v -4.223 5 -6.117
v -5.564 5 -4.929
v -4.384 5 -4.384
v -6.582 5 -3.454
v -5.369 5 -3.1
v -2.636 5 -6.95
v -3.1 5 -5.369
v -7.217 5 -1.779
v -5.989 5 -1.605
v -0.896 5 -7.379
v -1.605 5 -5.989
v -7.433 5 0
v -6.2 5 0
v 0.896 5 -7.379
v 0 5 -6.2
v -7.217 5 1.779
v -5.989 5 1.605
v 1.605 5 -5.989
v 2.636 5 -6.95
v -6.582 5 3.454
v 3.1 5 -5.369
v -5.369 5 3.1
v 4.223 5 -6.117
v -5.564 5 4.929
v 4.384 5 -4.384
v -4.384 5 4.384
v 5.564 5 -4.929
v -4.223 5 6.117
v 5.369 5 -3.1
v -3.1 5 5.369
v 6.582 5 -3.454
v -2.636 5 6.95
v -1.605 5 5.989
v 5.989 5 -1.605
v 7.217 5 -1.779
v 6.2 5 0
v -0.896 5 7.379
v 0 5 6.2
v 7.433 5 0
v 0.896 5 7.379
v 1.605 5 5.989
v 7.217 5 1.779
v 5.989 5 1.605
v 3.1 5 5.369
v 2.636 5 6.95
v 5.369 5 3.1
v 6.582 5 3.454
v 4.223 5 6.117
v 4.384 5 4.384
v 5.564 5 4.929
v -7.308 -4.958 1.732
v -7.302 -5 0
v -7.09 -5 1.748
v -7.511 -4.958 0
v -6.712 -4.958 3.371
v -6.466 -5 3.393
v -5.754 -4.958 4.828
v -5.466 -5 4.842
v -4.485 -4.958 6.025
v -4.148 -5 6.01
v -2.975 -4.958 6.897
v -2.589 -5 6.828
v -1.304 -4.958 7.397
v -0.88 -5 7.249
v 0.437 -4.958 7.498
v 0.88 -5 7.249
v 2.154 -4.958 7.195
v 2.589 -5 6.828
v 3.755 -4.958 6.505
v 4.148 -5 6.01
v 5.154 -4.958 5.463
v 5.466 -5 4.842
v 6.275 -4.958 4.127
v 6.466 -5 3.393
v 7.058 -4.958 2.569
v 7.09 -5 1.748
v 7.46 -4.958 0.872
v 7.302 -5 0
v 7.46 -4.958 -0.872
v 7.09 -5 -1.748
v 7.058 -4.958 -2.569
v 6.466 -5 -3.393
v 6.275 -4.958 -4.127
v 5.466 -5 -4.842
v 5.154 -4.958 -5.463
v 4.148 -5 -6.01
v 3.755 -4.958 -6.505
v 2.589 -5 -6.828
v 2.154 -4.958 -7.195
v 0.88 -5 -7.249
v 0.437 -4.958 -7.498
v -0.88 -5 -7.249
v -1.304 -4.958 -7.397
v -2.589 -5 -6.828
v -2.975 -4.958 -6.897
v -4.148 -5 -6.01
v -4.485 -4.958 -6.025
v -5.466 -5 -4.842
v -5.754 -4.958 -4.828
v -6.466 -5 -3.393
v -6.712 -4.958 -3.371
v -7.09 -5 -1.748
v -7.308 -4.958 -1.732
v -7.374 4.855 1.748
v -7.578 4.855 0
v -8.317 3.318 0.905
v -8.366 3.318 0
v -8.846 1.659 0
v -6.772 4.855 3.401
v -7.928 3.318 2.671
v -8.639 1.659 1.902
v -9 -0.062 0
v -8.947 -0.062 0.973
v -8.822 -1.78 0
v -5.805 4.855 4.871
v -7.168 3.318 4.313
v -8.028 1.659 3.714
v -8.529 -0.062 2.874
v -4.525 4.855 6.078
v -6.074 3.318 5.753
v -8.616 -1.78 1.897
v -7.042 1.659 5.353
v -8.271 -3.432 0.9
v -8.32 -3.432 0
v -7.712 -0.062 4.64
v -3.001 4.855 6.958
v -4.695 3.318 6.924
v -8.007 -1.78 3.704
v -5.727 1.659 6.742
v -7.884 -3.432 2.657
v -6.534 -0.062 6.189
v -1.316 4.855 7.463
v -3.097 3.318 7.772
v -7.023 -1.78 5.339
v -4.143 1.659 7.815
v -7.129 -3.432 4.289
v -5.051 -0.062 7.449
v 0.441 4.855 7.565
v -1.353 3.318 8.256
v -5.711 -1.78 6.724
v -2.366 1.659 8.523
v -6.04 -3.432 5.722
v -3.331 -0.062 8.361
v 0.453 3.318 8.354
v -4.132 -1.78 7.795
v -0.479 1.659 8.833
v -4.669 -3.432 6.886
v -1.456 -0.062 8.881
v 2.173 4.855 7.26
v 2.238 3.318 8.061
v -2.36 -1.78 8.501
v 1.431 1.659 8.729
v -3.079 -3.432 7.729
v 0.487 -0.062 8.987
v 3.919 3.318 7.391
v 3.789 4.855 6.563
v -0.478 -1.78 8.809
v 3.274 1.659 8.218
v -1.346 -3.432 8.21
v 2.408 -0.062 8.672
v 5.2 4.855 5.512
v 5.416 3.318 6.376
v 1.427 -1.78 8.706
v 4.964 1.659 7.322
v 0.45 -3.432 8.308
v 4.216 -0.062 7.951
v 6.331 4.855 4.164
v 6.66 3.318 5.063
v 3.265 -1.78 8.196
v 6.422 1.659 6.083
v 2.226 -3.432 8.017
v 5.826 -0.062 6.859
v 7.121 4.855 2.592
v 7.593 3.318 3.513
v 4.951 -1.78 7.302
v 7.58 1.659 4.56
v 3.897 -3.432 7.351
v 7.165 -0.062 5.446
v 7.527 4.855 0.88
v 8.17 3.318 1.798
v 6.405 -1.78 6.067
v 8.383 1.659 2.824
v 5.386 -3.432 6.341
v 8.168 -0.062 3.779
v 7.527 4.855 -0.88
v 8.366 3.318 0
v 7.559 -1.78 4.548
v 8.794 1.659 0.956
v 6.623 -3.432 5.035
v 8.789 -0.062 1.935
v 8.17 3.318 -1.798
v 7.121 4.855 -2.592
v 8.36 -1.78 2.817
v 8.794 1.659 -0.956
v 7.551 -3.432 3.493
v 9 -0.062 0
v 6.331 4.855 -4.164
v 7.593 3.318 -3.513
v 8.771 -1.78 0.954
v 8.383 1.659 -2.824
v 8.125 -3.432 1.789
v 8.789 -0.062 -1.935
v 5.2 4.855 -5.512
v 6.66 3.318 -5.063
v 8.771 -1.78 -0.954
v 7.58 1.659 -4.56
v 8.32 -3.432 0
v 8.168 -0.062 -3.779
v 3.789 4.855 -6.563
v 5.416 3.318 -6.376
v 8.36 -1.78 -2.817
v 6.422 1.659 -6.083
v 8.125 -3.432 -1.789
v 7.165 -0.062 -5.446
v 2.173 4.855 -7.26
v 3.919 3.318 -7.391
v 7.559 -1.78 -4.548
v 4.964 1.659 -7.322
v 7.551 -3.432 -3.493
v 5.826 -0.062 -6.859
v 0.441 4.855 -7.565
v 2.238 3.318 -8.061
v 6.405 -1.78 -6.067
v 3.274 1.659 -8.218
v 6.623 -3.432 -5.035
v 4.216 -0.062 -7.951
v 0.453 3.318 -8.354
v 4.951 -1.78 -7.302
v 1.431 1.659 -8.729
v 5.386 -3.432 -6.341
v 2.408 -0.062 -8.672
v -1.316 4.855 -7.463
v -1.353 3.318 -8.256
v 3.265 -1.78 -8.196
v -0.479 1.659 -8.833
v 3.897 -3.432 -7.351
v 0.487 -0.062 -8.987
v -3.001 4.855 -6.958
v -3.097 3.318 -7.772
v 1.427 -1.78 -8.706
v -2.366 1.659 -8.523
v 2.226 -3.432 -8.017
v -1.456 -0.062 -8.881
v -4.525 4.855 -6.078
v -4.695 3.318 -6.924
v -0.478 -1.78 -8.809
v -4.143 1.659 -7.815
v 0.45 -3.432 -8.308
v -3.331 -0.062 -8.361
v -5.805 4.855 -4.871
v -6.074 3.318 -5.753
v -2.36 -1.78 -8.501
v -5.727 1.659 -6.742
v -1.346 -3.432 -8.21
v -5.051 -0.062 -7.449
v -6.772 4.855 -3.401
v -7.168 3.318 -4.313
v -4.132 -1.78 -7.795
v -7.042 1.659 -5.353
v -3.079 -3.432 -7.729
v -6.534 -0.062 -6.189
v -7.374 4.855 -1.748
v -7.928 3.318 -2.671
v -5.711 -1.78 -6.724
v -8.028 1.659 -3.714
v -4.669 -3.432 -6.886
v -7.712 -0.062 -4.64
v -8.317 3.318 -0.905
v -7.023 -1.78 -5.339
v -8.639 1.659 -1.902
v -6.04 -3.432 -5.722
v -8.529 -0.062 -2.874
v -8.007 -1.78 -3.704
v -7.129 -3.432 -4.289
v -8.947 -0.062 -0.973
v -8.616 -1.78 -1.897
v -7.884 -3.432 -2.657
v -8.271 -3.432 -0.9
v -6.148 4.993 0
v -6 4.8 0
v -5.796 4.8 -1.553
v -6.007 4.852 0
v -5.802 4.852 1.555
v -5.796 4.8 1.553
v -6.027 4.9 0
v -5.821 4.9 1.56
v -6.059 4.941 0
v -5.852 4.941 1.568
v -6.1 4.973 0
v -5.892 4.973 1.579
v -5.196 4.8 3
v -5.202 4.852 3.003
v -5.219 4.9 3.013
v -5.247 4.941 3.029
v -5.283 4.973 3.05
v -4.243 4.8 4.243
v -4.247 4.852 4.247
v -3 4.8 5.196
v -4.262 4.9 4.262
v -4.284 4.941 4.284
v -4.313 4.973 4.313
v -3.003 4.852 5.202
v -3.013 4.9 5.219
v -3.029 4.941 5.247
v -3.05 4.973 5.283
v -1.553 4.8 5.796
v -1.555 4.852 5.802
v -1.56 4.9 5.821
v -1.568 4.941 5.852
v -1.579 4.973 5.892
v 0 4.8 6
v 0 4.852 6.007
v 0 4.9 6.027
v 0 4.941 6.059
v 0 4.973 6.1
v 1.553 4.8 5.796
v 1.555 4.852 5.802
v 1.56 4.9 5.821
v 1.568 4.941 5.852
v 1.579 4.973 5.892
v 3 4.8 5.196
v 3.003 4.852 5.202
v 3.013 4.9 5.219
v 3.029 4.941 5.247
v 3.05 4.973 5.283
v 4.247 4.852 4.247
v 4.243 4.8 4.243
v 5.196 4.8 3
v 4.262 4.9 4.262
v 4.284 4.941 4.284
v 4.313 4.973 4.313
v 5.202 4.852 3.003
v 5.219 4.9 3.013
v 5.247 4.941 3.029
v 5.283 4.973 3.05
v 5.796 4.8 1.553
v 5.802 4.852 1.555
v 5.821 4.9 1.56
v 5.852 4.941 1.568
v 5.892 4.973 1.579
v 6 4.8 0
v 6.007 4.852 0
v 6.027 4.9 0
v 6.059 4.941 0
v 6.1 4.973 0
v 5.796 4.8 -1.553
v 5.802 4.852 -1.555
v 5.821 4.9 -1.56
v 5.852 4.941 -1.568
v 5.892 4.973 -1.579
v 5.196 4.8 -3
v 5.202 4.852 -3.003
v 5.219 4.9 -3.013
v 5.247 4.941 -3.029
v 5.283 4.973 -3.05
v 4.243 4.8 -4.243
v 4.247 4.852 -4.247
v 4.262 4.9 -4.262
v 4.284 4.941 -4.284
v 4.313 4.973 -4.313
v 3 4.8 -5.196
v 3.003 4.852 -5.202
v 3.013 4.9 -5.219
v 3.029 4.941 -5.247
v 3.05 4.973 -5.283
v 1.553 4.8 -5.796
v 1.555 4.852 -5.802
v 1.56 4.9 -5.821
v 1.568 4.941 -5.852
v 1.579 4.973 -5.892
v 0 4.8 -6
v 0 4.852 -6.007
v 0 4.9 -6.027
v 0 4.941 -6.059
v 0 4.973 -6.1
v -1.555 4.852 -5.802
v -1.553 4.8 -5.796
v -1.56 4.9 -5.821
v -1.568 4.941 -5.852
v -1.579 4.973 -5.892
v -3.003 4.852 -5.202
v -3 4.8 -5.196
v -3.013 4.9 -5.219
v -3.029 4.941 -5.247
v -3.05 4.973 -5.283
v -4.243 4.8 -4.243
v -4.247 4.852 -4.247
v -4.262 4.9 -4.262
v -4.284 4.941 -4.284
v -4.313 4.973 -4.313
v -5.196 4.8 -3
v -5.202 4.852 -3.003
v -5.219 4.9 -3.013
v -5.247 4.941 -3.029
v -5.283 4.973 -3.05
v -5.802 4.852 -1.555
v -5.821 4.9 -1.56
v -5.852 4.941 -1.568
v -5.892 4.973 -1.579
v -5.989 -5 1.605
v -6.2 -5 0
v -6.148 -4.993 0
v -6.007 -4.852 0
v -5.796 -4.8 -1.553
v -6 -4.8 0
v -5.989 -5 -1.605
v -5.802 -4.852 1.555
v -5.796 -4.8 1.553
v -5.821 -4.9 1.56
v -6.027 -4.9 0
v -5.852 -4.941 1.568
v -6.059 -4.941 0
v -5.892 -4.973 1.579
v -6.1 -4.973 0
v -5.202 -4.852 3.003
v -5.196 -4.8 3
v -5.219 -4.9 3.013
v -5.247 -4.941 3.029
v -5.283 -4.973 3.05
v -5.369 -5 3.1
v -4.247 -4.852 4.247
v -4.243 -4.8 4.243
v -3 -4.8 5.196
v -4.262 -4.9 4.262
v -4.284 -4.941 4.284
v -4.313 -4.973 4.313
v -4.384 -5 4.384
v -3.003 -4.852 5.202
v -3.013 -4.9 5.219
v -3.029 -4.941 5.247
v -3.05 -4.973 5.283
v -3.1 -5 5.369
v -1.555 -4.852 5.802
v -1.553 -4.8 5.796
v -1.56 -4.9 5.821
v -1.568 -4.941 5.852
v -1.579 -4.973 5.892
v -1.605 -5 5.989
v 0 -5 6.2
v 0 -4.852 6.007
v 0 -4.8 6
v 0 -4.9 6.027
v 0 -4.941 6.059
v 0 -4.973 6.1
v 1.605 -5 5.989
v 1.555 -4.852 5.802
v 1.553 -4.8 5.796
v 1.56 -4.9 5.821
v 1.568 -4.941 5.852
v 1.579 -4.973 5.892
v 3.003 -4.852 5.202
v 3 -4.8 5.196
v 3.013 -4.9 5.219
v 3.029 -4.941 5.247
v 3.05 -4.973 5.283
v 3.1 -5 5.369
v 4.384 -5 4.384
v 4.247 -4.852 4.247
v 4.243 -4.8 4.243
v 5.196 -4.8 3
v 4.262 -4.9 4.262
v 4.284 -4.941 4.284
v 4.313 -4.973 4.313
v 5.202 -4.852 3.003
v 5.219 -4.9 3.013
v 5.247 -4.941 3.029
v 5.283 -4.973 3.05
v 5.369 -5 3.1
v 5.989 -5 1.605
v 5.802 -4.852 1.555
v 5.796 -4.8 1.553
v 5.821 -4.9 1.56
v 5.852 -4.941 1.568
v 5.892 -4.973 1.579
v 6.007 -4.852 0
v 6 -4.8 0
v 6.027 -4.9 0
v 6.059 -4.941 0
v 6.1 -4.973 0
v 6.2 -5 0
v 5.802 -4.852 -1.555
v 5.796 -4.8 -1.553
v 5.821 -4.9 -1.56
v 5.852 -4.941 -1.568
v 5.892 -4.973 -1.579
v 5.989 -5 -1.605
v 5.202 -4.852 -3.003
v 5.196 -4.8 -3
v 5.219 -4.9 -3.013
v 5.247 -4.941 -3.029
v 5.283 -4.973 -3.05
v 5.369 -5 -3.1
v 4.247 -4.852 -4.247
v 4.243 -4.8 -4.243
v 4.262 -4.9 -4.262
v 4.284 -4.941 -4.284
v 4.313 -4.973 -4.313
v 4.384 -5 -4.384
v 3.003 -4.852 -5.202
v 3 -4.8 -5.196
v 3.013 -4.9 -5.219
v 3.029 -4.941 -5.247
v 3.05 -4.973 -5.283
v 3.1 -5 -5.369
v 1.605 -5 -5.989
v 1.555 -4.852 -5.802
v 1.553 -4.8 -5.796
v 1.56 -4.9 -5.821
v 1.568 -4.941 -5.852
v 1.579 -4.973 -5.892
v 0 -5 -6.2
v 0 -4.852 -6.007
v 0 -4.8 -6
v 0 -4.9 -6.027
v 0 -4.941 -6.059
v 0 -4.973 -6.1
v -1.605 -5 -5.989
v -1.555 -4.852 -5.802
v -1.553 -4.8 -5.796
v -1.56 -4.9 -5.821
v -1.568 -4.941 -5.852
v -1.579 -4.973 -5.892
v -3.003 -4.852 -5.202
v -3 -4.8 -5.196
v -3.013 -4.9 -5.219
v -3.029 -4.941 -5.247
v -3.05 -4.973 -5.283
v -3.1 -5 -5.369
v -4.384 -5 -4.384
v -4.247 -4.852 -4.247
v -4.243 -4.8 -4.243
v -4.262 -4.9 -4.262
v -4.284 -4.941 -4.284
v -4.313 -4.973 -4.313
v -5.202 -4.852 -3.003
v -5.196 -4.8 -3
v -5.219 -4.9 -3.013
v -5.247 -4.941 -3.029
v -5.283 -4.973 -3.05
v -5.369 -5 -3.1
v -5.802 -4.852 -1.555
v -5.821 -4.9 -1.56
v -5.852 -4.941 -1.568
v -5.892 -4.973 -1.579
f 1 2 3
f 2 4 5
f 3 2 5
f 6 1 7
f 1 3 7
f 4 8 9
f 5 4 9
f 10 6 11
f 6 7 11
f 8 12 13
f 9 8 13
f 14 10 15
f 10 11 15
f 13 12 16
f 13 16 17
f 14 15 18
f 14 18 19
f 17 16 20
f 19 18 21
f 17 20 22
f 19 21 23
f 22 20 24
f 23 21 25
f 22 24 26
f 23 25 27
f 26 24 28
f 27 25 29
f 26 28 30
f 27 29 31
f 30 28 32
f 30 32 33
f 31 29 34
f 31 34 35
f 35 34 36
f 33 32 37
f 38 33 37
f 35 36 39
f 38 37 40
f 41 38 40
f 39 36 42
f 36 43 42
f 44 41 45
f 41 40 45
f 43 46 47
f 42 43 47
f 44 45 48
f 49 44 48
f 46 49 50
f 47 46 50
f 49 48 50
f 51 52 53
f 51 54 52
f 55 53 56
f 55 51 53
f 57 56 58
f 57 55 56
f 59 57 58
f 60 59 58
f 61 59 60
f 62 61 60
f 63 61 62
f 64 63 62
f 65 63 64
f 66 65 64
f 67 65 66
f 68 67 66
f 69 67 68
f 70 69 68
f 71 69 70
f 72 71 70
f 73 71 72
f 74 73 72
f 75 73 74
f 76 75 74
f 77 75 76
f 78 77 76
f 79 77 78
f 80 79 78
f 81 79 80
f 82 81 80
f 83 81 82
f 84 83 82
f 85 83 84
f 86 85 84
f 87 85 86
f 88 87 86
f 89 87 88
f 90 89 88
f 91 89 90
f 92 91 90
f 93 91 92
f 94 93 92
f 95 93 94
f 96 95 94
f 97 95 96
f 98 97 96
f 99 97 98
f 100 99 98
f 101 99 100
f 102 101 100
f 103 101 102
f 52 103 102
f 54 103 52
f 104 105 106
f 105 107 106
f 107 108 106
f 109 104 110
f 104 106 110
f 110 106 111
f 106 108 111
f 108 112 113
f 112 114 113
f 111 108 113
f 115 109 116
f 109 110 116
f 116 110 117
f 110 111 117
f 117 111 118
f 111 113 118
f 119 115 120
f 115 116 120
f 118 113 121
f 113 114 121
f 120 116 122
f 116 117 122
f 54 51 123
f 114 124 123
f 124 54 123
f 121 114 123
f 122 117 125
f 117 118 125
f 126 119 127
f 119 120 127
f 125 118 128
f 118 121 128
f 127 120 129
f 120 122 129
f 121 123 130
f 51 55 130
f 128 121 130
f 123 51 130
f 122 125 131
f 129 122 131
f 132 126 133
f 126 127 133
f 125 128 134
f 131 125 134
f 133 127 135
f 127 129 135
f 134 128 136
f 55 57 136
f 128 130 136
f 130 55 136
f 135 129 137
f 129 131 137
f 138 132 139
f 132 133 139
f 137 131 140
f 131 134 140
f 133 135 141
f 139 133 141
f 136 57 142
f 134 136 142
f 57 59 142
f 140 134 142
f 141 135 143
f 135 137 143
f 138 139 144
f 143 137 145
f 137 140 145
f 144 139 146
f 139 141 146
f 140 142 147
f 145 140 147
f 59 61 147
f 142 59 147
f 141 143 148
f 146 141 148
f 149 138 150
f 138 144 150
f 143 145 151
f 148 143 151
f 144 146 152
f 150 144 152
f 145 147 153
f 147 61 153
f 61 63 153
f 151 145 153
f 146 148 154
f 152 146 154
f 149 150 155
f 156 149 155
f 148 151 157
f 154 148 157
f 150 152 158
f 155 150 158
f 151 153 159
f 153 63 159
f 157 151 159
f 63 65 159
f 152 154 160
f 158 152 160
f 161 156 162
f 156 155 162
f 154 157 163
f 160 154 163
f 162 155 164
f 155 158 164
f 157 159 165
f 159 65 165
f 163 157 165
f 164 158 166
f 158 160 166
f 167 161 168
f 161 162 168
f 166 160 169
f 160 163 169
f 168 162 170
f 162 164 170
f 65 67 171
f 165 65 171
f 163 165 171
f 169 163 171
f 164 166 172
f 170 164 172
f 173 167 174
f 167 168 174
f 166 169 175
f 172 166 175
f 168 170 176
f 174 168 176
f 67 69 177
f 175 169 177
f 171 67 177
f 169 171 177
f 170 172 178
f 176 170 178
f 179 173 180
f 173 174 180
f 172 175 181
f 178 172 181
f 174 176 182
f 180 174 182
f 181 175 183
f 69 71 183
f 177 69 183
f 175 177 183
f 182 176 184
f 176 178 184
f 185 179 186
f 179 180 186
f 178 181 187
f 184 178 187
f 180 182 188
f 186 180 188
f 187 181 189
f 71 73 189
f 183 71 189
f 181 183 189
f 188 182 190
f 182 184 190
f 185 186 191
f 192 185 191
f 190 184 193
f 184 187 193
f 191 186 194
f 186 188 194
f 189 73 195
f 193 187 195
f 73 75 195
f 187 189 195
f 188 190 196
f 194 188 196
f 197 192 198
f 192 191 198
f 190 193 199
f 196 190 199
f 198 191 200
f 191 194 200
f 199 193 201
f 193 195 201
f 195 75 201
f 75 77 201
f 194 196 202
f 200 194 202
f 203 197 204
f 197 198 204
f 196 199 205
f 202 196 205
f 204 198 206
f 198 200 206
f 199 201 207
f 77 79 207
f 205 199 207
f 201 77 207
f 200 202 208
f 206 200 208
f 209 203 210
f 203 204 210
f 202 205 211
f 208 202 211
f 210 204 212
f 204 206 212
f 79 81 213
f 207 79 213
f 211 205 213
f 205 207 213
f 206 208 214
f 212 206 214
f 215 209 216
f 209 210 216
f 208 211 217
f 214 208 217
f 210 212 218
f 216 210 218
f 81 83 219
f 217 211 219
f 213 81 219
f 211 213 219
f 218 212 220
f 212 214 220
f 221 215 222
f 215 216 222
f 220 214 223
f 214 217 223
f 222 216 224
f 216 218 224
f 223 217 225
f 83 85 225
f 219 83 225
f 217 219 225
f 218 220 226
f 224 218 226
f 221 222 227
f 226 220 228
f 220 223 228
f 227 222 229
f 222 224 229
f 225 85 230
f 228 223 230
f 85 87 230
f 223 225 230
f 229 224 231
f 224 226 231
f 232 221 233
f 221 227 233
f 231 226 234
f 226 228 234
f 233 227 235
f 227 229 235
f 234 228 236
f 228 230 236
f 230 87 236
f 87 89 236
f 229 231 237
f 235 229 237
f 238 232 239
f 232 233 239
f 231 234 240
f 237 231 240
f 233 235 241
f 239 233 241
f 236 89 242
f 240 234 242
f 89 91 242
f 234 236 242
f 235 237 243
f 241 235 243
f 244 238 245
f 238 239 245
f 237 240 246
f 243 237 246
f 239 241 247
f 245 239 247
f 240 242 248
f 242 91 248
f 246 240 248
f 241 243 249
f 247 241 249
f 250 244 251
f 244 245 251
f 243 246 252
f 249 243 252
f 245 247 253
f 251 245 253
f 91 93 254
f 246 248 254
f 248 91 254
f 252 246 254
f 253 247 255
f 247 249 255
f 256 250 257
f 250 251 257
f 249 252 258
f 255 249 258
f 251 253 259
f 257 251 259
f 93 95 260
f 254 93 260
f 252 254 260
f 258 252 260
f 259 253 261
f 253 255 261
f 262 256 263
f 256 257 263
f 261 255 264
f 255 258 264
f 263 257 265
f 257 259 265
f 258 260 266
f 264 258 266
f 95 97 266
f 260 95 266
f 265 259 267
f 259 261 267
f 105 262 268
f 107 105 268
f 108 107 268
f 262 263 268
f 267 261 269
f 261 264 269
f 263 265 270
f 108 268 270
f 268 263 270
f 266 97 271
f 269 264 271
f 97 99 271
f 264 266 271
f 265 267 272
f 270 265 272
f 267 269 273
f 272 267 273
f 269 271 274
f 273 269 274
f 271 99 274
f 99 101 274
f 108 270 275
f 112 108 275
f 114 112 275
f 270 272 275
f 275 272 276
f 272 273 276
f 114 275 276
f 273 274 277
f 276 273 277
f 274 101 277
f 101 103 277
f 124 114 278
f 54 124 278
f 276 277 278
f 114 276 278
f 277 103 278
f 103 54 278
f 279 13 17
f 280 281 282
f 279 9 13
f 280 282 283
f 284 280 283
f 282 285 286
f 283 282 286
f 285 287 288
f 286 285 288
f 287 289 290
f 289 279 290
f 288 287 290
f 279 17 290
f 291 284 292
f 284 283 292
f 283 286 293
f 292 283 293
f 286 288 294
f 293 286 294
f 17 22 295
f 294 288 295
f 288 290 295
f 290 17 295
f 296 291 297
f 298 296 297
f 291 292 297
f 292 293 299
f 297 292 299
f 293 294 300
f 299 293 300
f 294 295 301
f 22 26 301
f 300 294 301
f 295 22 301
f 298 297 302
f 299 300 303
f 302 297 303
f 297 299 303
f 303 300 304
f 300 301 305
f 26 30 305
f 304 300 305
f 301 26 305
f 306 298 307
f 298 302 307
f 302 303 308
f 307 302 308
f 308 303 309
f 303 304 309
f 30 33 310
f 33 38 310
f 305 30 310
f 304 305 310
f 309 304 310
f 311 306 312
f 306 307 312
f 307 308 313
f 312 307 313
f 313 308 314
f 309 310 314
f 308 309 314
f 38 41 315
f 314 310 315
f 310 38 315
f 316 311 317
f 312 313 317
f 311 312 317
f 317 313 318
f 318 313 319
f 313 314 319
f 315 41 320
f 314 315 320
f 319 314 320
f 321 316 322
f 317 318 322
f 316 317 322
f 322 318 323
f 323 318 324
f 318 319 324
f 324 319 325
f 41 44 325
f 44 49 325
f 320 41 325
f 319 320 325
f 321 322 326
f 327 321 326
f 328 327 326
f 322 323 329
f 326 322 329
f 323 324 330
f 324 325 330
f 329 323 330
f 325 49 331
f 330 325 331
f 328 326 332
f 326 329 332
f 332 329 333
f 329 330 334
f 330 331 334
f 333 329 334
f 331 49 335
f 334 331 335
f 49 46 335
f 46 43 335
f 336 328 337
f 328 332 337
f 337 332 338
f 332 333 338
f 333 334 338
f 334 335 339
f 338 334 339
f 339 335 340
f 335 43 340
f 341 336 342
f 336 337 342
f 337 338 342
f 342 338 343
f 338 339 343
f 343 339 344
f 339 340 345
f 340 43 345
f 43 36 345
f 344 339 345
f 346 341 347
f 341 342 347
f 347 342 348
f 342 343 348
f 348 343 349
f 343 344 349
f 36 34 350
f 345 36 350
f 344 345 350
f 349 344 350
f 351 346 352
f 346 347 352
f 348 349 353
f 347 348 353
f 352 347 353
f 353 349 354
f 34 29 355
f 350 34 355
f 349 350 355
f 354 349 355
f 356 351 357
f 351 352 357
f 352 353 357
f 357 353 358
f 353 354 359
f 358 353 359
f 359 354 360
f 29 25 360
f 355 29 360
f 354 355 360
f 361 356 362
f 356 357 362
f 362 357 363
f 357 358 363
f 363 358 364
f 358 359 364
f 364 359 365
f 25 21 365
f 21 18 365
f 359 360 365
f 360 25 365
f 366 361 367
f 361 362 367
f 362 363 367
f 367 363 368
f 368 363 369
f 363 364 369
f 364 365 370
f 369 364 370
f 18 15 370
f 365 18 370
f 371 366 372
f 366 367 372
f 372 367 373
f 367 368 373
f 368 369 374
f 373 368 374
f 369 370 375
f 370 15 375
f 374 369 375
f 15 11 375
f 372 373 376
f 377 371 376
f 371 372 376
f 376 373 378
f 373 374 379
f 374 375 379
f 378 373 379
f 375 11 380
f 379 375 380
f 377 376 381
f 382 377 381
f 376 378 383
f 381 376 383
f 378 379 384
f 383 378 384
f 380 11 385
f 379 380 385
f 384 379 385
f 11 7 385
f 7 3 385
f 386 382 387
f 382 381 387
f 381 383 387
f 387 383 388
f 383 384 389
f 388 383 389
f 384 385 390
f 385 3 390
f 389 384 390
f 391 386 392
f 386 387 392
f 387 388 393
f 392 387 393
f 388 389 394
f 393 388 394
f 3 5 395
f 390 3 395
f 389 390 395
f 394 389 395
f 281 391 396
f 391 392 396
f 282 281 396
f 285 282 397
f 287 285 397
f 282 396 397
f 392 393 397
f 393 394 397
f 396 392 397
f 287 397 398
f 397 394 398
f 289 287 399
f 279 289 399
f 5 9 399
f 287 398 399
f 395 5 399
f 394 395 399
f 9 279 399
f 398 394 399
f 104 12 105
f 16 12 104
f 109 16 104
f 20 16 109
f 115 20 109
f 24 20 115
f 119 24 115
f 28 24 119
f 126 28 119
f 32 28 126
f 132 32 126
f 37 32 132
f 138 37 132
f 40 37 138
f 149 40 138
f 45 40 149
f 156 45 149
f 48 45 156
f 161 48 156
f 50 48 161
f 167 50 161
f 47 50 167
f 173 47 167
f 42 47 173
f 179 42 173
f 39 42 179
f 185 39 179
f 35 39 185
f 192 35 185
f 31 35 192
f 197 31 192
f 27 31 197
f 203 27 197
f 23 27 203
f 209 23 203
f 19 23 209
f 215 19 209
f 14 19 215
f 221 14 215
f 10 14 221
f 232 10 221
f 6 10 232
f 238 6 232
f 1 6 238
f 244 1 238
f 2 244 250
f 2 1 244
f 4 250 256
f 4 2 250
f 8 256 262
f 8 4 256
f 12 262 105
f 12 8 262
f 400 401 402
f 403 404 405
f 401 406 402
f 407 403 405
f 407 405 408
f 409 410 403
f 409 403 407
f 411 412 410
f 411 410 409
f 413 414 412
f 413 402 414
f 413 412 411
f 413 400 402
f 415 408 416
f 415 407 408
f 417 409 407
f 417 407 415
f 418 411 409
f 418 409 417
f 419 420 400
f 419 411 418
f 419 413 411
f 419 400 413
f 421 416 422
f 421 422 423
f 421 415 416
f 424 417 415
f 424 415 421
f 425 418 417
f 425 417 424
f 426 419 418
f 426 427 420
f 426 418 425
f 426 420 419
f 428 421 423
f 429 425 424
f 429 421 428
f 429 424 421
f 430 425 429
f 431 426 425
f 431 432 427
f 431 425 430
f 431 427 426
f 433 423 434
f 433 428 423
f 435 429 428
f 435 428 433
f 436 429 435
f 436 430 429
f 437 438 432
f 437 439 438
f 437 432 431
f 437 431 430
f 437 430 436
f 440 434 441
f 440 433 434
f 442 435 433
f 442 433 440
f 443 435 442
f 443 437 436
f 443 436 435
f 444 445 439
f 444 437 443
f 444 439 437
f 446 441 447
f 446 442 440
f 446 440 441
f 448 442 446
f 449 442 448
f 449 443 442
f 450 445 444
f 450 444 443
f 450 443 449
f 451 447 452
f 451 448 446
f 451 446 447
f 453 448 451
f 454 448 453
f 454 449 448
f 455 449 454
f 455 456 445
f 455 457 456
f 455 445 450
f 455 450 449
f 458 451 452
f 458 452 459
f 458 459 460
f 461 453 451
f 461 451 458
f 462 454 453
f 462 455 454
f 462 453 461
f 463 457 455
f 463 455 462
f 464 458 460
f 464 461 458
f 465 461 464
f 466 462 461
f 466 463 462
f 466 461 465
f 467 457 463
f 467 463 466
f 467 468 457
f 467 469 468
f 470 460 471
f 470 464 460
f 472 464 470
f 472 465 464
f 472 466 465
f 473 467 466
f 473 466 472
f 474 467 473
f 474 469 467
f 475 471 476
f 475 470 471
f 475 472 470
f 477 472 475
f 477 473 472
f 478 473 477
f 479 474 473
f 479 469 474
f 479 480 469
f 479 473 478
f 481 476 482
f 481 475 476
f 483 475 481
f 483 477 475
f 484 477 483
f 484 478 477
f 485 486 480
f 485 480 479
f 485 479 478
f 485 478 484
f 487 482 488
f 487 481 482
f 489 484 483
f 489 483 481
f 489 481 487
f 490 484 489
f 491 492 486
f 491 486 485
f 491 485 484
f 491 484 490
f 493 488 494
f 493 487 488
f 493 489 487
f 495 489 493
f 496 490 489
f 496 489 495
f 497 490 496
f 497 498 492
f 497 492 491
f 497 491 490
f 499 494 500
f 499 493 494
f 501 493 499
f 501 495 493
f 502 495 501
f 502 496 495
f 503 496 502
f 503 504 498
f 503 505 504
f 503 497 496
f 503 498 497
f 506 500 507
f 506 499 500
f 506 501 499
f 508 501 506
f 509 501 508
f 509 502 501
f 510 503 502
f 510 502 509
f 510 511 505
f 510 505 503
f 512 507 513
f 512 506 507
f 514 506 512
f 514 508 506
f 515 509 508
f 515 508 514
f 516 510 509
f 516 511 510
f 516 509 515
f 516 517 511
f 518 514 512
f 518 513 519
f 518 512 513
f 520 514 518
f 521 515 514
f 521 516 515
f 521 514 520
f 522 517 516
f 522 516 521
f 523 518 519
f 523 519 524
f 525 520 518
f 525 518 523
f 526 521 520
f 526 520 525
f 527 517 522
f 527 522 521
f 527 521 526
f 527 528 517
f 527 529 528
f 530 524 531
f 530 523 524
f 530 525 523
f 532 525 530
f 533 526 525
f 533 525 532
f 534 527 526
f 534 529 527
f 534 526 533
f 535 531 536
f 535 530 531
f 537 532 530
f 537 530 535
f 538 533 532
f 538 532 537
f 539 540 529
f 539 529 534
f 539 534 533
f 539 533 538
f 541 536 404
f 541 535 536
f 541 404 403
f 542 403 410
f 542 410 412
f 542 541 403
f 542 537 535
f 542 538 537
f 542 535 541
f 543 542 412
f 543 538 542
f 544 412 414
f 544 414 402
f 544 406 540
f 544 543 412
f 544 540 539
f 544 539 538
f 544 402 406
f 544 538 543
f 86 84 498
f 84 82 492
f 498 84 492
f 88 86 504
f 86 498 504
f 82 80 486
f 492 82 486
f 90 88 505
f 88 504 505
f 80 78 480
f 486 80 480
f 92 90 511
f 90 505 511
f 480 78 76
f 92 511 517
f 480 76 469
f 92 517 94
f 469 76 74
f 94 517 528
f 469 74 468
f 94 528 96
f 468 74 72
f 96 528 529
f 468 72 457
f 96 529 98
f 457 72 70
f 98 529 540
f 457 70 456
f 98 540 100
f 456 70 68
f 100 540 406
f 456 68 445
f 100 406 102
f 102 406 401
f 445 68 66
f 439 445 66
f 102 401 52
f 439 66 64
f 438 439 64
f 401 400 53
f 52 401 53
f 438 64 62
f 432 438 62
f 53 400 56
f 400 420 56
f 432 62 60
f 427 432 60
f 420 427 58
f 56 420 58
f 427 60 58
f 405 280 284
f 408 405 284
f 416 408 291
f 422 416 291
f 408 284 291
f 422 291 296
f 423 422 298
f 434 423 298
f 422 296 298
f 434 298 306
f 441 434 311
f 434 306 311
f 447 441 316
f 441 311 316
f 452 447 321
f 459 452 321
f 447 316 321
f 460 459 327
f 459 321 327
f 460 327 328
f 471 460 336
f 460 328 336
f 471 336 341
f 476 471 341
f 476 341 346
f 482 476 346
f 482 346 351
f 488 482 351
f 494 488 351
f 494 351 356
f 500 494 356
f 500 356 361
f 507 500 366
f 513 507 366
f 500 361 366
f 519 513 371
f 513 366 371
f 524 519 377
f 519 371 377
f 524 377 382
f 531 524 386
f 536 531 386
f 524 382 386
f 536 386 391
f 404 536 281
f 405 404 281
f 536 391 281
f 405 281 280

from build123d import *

# Parameters (mm, degrees)
FILLET1_R       = 0.2
CHAMFER1_SIZE   = 0.181209408
CHAMFER1_SIZE_2 = 0.05


with BuildPart() as part:
    # Sketch1 → Revolve1 (revolve)
    with BuildSketch(Plane.XY):
        with BuildLine():
            Line((-6, -5), (-6, 5))
            Line((-6, 5), (-7.483314774, 5))
            ThreePointArc((-7.483314774, 5), (-9, 0), (-7.483314774, -5))
            Line((-7.483314774, -5), (-6, -5))
        make_face()
    revolve(axis=Axis((0, 0, 0), (0, 1, 0)))

    # Fillet1
    fillet1_edges = [part.edges().sort_by_distance(p)[0] for p in [
        (6, 5, 0),
        (6, -5, 0),
    ]]
    fillet(fillet1_edges, radius=FILLET1_R)

    # Chamfer1
    # the kernel refuses this chamfer: 0.181209408, 0.05 mm, written as the material it takes off along each edge
    with BuildSketch(Plane(origin=(0, -5, 0), x_dir=(-1, 0, 0), z_dir=(0, 0, -1))) as chamfer1_piece_1:
        with BuildLine():
            Line((7.483314774 - CHAMFER1_SIZE, 0), (7.510900969, 0.041535859))
            ThreePointArc((7.510900969, 0.041535859), (7.49854981, 0.022877263), (7.483314774, 0))
            Line((7.483314774, 0), (7.483314774 - CHAMFER1_SIZE, 0))
        make_face()
    revolve(axis=Axis((0, -5, 0), (0, 1, 0)), mode=Mode.SUBTRACT)
    with BuildSketch(Plane(origin=(0, 5, 0), x_dir=(-1, 0, 0), z_dir=(0, 0, -1))) as chamfer1_piece_2:
        with BuildLine():
            Line((7.577969598, -0.144654824), (7.483314774 - CHAMFER1_SIZE_2, 0))
            Line((7.483314774 - CHAMFER1_SIZE_2, 0), (7.483314774, 0))
            ThreePointArc((7.483314774, 0), (7.532931313, -0.075068951), (7.577969598, -0.144654824))
        make_face()
    revolve(axis=Axis((0, 5, 0), (0, 1, 0)), mode=Mode.SUBTRACT)


solid = part.part
